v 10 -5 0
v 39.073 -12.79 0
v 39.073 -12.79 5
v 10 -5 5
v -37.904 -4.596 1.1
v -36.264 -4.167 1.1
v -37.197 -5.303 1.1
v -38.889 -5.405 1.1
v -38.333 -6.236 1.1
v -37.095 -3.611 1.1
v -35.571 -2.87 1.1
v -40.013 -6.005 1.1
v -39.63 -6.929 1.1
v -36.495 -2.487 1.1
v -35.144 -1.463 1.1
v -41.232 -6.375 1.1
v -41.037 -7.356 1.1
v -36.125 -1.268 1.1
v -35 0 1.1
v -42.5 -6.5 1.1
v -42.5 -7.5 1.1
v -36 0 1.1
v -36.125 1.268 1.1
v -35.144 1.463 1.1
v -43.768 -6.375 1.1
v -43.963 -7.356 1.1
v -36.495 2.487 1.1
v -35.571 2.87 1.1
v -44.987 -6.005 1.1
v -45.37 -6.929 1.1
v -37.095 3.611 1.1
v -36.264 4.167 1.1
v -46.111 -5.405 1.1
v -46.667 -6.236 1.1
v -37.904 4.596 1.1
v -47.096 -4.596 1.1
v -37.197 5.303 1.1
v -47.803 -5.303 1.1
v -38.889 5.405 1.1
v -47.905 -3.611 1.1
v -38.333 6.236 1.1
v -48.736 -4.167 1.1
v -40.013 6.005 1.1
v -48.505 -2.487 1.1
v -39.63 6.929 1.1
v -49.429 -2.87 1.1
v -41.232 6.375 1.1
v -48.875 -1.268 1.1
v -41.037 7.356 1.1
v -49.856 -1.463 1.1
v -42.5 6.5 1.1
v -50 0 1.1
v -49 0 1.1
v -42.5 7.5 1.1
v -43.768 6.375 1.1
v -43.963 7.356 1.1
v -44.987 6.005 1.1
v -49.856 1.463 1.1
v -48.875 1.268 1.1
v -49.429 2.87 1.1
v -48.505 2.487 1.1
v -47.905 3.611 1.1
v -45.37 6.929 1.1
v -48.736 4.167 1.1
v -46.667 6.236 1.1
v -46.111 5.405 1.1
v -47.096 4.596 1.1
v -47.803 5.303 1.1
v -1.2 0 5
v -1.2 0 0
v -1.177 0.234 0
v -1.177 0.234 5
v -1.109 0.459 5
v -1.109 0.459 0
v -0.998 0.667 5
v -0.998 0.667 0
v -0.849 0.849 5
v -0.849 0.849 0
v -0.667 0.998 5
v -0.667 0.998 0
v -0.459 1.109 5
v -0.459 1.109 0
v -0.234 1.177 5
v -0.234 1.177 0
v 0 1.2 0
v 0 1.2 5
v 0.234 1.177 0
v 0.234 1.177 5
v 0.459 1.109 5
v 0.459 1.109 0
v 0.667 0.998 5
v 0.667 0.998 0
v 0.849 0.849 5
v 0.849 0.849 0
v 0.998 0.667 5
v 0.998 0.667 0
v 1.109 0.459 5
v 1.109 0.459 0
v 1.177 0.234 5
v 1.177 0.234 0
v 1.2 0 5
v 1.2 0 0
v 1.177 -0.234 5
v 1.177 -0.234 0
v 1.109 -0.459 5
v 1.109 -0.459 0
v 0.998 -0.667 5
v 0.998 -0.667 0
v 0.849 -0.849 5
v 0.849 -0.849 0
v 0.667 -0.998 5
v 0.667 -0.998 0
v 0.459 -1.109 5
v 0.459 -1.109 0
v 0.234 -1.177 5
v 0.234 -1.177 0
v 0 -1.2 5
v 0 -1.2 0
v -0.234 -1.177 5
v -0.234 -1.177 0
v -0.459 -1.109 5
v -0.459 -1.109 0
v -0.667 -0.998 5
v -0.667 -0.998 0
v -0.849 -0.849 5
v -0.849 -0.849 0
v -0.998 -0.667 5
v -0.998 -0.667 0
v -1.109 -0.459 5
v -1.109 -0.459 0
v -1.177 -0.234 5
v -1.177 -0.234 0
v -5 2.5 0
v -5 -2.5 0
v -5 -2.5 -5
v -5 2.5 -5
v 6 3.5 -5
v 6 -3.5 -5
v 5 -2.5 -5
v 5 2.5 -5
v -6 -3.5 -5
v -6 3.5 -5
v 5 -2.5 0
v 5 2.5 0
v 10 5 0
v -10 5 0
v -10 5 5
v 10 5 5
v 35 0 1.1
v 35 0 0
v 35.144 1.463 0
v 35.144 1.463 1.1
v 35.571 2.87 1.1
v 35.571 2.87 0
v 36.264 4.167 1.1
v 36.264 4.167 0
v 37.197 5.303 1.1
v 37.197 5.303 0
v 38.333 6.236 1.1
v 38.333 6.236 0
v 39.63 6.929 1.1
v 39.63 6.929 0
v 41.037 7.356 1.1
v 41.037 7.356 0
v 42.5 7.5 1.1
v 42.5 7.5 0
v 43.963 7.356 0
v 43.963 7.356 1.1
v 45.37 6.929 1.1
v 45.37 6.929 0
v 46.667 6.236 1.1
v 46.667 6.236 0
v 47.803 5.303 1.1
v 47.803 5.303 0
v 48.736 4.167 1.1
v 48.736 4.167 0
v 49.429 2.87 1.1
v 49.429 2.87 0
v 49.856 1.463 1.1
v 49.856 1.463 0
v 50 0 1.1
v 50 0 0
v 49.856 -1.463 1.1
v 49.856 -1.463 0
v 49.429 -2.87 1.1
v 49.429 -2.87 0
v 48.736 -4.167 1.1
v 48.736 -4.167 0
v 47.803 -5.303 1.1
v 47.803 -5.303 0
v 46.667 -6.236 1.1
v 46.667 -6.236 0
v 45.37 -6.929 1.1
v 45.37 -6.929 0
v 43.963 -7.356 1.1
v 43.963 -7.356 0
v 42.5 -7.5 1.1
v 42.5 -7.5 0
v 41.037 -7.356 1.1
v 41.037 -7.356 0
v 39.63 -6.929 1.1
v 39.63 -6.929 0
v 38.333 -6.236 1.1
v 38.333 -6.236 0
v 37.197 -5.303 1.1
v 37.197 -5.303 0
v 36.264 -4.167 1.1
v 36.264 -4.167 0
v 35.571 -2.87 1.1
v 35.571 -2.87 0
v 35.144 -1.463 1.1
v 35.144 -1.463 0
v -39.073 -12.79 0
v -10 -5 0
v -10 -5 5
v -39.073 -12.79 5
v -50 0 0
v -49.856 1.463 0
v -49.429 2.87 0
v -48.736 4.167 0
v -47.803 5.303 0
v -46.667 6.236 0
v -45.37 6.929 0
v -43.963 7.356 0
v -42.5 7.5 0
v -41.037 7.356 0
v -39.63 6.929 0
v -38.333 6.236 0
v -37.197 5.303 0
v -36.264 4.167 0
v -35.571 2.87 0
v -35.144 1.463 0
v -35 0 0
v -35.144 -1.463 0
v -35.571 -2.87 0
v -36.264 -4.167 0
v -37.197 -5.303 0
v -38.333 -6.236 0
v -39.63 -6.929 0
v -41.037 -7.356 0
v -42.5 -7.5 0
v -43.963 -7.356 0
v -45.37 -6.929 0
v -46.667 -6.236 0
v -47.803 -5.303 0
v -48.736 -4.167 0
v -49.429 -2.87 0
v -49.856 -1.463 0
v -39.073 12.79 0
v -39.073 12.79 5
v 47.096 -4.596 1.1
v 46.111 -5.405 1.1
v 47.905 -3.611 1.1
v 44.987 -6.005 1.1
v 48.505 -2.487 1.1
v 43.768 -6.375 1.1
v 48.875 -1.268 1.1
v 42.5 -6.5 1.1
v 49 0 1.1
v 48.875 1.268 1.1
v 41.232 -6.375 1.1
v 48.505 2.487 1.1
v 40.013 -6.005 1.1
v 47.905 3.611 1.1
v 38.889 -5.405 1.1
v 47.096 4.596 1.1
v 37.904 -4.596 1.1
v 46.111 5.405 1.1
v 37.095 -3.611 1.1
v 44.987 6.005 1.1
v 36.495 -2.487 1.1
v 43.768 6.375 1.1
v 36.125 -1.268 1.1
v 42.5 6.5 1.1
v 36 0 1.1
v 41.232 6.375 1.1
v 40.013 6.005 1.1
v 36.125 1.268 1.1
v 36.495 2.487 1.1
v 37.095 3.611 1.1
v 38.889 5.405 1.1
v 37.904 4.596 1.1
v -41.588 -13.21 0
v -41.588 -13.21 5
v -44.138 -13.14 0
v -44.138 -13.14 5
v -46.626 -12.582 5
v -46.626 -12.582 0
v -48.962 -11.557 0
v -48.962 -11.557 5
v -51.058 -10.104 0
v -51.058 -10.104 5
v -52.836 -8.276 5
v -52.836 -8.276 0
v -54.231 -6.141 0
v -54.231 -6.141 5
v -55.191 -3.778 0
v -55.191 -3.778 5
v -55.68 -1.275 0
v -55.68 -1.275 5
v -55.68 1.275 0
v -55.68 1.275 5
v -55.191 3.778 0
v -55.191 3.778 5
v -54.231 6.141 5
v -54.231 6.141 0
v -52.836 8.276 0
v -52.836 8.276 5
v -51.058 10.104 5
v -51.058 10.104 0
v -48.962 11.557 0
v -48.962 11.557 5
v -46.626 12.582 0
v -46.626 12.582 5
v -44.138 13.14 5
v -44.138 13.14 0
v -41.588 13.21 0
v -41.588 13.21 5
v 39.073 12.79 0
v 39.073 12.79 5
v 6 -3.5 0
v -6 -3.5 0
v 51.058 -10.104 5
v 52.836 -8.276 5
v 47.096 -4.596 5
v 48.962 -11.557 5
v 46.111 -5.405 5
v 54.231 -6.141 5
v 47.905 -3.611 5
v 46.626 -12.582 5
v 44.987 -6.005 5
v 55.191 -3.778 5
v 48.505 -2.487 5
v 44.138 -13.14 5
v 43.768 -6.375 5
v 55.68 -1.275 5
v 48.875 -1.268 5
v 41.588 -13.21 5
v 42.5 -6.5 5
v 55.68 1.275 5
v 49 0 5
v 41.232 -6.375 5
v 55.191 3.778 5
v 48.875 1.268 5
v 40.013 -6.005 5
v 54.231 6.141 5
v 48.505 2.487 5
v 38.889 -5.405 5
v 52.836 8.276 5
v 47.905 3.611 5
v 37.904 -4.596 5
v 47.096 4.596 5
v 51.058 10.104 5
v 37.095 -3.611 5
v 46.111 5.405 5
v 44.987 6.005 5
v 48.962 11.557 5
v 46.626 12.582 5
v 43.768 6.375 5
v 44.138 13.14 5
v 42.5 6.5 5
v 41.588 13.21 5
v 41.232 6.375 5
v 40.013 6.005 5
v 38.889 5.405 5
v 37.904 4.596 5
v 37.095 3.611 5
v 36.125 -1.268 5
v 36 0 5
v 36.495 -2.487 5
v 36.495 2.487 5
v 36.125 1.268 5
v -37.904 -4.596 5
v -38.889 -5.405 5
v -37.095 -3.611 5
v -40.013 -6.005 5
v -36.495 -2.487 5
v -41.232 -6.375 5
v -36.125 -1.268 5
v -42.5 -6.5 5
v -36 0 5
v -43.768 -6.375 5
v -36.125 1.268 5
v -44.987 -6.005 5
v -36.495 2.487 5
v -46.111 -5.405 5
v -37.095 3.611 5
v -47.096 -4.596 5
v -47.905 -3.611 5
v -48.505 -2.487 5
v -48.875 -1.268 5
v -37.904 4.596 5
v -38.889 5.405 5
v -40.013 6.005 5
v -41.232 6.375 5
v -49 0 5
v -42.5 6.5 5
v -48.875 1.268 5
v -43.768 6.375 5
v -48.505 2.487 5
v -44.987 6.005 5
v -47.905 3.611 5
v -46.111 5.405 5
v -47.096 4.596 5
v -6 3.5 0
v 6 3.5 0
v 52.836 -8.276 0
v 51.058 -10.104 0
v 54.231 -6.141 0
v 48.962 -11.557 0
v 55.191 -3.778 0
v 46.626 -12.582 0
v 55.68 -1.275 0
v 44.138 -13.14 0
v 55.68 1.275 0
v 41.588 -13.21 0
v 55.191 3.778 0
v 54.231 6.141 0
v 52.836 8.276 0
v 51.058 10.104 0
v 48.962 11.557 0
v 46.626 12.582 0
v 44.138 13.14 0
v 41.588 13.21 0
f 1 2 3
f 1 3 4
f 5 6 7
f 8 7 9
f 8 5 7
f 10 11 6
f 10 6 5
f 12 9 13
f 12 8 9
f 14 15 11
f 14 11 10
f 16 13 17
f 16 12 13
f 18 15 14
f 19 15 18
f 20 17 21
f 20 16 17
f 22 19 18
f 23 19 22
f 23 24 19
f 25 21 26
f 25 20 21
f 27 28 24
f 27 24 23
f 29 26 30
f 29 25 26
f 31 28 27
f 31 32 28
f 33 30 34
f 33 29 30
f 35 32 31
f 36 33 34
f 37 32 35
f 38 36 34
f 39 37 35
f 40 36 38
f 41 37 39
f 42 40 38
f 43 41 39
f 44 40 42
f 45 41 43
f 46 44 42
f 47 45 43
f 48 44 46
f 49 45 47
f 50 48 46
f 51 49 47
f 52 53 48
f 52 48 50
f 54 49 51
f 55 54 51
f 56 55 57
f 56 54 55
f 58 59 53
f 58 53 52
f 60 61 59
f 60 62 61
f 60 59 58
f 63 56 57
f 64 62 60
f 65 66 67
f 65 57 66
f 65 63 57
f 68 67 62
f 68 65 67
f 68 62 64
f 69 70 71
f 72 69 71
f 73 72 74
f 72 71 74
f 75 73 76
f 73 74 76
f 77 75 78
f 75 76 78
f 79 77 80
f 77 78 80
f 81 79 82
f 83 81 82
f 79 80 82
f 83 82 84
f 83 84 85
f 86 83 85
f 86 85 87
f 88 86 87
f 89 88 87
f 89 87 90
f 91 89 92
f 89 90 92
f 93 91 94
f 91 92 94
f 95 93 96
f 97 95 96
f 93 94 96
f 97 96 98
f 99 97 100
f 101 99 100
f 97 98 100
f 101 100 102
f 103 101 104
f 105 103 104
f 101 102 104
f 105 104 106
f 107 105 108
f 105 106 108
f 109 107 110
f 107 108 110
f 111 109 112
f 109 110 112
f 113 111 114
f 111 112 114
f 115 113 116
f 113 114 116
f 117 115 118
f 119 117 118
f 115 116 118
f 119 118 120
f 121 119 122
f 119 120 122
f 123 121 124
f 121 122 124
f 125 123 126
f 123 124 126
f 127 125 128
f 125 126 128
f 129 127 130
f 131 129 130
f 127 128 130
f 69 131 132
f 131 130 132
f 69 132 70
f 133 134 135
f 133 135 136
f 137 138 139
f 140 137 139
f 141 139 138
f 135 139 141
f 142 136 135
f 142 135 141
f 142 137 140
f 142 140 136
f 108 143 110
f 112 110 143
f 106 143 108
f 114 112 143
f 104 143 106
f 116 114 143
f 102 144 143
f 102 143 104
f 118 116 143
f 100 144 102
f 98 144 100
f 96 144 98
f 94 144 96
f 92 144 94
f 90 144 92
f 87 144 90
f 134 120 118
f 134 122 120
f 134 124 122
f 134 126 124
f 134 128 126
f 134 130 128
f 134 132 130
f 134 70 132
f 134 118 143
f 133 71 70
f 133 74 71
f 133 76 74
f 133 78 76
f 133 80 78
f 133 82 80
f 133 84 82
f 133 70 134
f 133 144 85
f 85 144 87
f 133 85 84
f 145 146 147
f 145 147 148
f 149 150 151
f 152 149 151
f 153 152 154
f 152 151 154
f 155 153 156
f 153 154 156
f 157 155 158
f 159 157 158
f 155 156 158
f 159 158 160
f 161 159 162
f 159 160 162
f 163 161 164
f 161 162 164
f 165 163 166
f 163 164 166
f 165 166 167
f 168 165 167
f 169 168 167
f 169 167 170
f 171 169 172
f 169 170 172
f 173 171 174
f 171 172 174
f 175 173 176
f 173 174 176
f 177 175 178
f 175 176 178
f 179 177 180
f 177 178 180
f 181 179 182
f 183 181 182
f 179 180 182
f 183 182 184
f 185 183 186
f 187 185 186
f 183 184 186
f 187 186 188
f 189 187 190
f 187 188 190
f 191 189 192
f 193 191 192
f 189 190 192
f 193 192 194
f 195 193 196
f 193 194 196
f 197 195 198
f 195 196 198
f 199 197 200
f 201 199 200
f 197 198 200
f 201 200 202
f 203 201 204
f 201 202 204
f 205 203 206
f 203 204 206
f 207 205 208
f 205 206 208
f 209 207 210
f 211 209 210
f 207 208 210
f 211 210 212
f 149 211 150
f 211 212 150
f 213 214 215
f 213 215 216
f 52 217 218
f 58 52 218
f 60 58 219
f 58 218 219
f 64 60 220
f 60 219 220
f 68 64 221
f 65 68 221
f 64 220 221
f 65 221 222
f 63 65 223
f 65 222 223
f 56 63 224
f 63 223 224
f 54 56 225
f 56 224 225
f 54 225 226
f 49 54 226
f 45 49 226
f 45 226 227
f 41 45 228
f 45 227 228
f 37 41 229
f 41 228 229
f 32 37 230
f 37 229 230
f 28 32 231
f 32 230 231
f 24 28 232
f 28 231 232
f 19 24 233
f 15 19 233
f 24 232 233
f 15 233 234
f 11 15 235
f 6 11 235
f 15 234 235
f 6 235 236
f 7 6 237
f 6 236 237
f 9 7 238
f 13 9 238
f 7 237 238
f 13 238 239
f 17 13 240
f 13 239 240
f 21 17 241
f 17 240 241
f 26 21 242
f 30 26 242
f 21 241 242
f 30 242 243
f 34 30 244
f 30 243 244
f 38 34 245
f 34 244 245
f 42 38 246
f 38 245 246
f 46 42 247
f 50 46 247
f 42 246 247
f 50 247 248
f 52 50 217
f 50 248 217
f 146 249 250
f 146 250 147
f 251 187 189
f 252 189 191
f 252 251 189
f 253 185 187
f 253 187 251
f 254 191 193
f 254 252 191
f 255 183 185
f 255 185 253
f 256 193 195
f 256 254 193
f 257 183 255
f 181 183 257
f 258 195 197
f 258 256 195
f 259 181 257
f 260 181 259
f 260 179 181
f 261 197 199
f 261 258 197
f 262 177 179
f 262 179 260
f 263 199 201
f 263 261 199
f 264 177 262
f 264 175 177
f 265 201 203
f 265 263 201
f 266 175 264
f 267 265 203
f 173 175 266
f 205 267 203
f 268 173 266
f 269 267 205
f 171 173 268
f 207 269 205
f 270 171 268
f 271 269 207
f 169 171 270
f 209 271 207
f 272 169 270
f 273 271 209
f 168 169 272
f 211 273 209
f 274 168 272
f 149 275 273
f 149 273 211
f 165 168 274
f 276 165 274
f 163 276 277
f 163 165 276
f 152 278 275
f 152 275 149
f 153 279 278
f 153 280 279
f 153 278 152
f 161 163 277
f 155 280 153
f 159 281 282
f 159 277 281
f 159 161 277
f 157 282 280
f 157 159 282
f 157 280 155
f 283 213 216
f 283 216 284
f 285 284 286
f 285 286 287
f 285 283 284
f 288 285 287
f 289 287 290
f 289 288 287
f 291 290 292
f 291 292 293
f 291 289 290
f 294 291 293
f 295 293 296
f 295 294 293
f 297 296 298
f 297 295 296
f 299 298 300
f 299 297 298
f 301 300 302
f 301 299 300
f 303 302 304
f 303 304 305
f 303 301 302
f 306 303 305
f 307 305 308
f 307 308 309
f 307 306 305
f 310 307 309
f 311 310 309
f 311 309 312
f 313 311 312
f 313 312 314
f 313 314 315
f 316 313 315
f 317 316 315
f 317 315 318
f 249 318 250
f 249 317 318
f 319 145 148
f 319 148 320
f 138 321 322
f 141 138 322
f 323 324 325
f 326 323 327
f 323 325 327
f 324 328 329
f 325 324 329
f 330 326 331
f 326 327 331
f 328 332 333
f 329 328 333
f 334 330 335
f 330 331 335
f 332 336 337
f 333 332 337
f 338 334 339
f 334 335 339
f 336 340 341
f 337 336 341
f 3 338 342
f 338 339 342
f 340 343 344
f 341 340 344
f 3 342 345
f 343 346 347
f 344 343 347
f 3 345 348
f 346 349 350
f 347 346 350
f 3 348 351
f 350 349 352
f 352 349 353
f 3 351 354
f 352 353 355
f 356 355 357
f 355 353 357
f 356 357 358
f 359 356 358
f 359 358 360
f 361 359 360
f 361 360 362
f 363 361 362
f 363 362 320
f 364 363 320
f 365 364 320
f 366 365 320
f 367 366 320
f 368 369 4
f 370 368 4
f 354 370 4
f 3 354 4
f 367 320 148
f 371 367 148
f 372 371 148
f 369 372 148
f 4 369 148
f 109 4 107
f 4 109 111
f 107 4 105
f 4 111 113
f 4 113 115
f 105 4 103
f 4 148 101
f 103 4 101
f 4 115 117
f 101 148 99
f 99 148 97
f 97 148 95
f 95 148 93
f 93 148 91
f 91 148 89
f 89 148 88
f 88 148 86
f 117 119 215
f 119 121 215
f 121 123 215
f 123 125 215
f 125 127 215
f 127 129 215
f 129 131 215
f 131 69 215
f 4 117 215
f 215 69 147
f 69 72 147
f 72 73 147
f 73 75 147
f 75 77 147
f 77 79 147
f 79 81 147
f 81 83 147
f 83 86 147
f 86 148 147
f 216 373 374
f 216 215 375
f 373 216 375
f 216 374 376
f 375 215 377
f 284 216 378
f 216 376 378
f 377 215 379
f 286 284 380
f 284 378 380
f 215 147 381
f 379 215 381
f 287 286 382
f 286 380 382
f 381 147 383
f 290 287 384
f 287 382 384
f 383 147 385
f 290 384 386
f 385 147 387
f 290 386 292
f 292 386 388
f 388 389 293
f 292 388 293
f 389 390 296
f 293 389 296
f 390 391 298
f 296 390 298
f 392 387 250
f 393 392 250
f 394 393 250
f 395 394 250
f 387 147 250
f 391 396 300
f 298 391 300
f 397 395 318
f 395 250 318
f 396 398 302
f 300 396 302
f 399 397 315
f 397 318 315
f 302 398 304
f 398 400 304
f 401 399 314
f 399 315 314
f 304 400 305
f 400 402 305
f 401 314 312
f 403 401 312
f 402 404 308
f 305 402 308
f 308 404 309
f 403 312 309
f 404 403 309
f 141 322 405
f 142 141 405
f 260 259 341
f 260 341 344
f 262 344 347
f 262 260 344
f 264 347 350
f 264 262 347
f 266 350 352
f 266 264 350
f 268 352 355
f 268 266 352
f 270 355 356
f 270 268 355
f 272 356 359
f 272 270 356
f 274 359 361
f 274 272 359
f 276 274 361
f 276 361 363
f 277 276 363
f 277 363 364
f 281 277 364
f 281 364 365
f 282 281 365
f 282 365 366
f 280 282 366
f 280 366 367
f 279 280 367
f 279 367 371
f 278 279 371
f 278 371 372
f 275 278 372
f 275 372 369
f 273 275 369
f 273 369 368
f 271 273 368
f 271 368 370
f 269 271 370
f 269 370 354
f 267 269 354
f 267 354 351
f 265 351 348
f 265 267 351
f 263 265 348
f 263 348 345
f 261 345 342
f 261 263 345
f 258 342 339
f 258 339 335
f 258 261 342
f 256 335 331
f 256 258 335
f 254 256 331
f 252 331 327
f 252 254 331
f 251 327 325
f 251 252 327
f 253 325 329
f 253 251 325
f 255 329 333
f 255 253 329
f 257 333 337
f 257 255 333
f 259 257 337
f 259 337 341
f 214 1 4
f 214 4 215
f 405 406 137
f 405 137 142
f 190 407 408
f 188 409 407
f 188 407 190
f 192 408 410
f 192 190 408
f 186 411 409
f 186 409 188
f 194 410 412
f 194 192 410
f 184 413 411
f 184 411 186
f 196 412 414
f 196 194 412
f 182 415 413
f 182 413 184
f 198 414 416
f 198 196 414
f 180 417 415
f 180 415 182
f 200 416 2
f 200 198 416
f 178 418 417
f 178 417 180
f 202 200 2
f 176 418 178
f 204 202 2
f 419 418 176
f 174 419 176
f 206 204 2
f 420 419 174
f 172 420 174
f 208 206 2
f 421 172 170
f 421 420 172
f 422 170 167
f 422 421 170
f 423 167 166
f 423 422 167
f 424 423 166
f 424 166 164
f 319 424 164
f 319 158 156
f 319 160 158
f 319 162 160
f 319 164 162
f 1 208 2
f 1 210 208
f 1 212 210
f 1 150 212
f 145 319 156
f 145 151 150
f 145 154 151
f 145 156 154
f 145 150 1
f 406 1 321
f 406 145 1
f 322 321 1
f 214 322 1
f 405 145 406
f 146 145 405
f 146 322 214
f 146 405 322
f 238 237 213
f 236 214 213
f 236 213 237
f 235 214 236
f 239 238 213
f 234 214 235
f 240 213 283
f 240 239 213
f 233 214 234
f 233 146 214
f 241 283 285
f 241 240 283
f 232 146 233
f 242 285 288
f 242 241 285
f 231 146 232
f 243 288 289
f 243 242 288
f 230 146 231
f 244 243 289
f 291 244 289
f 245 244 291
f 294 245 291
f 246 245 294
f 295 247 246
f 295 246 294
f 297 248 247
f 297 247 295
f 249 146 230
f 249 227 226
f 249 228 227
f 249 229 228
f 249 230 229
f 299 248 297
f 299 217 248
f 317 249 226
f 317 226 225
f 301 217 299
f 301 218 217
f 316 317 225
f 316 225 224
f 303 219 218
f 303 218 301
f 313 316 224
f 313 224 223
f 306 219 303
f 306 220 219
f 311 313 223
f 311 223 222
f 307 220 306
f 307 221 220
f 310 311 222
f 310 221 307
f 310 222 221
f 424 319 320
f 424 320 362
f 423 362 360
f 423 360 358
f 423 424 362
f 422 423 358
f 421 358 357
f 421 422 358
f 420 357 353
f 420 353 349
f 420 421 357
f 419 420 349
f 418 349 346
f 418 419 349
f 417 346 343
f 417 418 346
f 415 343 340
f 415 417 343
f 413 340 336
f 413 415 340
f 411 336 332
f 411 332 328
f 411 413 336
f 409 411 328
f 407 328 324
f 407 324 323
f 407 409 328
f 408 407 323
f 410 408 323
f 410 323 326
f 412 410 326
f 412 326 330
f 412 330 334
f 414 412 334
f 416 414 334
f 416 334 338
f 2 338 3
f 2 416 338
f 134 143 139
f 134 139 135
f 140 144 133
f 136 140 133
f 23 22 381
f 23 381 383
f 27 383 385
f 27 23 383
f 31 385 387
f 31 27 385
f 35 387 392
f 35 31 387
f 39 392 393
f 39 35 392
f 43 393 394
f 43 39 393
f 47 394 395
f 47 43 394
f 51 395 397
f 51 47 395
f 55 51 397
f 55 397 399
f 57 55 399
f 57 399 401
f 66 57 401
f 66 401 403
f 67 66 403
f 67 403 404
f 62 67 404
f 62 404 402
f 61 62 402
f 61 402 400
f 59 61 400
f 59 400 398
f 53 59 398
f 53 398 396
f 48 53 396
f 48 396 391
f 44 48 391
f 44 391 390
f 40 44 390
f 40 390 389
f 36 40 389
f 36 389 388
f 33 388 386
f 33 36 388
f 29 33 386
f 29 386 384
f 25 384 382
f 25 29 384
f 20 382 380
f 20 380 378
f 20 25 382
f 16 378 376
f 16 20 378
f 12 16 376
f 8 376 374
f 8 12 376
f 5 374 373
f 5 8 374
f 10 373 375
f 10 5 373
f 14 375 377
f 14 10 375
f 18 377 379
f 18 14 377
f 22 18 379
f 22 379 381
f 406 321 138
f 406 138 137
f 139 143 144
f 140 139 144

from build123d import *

# Parameters (mm, degrees)
SKETCH_1_R          = 6.5
EXTRUDE_1_DEPTH     = 5
SKETCH_2_W          = 12
SKETCH_2_H          = 7
SKETCH_2_W_2        = 10
SKETCH_2_H_2        = 5
EXTRUDE_1_2_DEPTH   = 5
SKETCH_3_R          = 1.2
CUT_EXTRUDE_1_DEPTH = 5
SKETCH_4_R          = 7.5
CUT_EXTRUDE_2_DEPTH = 1.1


with BuildPart() as part:
    # 草图1 → Extrude 1 (new body)
    with BuildSketch(Plane.XY):
        with BuildLine():
            Line((-10, 5), (10, 5))
            Line((10, 5), (39.072912811, 12.790063509))
            ThreePointArc((39.072912811, 12.790063509), (55.741248097, 0), (39.072912811, -12.790063509))
            Line((39.072912811, -12.790063509), (10, -5))
            Line((10, -5), (-10, -5))
            Line((-10, -5), (-39.072912811, -12.790063509))
            ThreePointArc((-39.072912811, -12.790063509), (-55.741248097, 0), (-39.072912811, 12.790063509))
            Line((-39.072912811, 12.790063509), (-10, 5))
        make_face()
        with Locations((-42.5, 0)):
            Circle(SKETCH_1_R, mode=Mode.SUBTRACT)
        with Locations((42.5, 0)):
            Circle(SKETCH_1_R, mode=Mode.SUBTRACT)
    extrude(amount=EXTRUDE_1_DEPTH)

    # 草图2 → Extrude 1 2 (add)
    with BuildSketch(Plane(origin=(0, 0, 0), x_dir=(-1, 0, 0), z_dir=(0, 0, -1))):
        Rectangle(SKETCH_2_W, SKETCH_2_H)
        Rectangle(SKETCH_2_W_2, SKETCH_2_H_2, mode=Mode.SUBTRACT)
    extrude(amount=EXTRUDE_1_2_DEPTH)

    # 草图3 → 切除-拉伸1 (cut)
    with BuildSketch(Plane(origin=(0, 0, 0), x_dir=(-1, 0, 0), z_dir=(0, 0, -1))):
        Circle(SKETCH_3_R)
    extrude(amount=-CUT_EXTRUDE_1_DEPTH, mode=Mode.SUBTRACT)

    # 草图4 → 切除-拉伸2 (cut)
    with BuildSketch(Plane(origin=(0, 0, 0), x_dir=(-1, 0, 0), z_dir=(0, 0, -1))):
        with Locations((-42.5, 0)):
            Circle(SKETCH_4_R)
        with Locations((42.5, 0)):
            Circle(SKETCH_4_R)
    extrude(amount=-CUT_EXTRUDE_2_DEPTH, mode=Mode.SUBTRACT)


solid = part.part
